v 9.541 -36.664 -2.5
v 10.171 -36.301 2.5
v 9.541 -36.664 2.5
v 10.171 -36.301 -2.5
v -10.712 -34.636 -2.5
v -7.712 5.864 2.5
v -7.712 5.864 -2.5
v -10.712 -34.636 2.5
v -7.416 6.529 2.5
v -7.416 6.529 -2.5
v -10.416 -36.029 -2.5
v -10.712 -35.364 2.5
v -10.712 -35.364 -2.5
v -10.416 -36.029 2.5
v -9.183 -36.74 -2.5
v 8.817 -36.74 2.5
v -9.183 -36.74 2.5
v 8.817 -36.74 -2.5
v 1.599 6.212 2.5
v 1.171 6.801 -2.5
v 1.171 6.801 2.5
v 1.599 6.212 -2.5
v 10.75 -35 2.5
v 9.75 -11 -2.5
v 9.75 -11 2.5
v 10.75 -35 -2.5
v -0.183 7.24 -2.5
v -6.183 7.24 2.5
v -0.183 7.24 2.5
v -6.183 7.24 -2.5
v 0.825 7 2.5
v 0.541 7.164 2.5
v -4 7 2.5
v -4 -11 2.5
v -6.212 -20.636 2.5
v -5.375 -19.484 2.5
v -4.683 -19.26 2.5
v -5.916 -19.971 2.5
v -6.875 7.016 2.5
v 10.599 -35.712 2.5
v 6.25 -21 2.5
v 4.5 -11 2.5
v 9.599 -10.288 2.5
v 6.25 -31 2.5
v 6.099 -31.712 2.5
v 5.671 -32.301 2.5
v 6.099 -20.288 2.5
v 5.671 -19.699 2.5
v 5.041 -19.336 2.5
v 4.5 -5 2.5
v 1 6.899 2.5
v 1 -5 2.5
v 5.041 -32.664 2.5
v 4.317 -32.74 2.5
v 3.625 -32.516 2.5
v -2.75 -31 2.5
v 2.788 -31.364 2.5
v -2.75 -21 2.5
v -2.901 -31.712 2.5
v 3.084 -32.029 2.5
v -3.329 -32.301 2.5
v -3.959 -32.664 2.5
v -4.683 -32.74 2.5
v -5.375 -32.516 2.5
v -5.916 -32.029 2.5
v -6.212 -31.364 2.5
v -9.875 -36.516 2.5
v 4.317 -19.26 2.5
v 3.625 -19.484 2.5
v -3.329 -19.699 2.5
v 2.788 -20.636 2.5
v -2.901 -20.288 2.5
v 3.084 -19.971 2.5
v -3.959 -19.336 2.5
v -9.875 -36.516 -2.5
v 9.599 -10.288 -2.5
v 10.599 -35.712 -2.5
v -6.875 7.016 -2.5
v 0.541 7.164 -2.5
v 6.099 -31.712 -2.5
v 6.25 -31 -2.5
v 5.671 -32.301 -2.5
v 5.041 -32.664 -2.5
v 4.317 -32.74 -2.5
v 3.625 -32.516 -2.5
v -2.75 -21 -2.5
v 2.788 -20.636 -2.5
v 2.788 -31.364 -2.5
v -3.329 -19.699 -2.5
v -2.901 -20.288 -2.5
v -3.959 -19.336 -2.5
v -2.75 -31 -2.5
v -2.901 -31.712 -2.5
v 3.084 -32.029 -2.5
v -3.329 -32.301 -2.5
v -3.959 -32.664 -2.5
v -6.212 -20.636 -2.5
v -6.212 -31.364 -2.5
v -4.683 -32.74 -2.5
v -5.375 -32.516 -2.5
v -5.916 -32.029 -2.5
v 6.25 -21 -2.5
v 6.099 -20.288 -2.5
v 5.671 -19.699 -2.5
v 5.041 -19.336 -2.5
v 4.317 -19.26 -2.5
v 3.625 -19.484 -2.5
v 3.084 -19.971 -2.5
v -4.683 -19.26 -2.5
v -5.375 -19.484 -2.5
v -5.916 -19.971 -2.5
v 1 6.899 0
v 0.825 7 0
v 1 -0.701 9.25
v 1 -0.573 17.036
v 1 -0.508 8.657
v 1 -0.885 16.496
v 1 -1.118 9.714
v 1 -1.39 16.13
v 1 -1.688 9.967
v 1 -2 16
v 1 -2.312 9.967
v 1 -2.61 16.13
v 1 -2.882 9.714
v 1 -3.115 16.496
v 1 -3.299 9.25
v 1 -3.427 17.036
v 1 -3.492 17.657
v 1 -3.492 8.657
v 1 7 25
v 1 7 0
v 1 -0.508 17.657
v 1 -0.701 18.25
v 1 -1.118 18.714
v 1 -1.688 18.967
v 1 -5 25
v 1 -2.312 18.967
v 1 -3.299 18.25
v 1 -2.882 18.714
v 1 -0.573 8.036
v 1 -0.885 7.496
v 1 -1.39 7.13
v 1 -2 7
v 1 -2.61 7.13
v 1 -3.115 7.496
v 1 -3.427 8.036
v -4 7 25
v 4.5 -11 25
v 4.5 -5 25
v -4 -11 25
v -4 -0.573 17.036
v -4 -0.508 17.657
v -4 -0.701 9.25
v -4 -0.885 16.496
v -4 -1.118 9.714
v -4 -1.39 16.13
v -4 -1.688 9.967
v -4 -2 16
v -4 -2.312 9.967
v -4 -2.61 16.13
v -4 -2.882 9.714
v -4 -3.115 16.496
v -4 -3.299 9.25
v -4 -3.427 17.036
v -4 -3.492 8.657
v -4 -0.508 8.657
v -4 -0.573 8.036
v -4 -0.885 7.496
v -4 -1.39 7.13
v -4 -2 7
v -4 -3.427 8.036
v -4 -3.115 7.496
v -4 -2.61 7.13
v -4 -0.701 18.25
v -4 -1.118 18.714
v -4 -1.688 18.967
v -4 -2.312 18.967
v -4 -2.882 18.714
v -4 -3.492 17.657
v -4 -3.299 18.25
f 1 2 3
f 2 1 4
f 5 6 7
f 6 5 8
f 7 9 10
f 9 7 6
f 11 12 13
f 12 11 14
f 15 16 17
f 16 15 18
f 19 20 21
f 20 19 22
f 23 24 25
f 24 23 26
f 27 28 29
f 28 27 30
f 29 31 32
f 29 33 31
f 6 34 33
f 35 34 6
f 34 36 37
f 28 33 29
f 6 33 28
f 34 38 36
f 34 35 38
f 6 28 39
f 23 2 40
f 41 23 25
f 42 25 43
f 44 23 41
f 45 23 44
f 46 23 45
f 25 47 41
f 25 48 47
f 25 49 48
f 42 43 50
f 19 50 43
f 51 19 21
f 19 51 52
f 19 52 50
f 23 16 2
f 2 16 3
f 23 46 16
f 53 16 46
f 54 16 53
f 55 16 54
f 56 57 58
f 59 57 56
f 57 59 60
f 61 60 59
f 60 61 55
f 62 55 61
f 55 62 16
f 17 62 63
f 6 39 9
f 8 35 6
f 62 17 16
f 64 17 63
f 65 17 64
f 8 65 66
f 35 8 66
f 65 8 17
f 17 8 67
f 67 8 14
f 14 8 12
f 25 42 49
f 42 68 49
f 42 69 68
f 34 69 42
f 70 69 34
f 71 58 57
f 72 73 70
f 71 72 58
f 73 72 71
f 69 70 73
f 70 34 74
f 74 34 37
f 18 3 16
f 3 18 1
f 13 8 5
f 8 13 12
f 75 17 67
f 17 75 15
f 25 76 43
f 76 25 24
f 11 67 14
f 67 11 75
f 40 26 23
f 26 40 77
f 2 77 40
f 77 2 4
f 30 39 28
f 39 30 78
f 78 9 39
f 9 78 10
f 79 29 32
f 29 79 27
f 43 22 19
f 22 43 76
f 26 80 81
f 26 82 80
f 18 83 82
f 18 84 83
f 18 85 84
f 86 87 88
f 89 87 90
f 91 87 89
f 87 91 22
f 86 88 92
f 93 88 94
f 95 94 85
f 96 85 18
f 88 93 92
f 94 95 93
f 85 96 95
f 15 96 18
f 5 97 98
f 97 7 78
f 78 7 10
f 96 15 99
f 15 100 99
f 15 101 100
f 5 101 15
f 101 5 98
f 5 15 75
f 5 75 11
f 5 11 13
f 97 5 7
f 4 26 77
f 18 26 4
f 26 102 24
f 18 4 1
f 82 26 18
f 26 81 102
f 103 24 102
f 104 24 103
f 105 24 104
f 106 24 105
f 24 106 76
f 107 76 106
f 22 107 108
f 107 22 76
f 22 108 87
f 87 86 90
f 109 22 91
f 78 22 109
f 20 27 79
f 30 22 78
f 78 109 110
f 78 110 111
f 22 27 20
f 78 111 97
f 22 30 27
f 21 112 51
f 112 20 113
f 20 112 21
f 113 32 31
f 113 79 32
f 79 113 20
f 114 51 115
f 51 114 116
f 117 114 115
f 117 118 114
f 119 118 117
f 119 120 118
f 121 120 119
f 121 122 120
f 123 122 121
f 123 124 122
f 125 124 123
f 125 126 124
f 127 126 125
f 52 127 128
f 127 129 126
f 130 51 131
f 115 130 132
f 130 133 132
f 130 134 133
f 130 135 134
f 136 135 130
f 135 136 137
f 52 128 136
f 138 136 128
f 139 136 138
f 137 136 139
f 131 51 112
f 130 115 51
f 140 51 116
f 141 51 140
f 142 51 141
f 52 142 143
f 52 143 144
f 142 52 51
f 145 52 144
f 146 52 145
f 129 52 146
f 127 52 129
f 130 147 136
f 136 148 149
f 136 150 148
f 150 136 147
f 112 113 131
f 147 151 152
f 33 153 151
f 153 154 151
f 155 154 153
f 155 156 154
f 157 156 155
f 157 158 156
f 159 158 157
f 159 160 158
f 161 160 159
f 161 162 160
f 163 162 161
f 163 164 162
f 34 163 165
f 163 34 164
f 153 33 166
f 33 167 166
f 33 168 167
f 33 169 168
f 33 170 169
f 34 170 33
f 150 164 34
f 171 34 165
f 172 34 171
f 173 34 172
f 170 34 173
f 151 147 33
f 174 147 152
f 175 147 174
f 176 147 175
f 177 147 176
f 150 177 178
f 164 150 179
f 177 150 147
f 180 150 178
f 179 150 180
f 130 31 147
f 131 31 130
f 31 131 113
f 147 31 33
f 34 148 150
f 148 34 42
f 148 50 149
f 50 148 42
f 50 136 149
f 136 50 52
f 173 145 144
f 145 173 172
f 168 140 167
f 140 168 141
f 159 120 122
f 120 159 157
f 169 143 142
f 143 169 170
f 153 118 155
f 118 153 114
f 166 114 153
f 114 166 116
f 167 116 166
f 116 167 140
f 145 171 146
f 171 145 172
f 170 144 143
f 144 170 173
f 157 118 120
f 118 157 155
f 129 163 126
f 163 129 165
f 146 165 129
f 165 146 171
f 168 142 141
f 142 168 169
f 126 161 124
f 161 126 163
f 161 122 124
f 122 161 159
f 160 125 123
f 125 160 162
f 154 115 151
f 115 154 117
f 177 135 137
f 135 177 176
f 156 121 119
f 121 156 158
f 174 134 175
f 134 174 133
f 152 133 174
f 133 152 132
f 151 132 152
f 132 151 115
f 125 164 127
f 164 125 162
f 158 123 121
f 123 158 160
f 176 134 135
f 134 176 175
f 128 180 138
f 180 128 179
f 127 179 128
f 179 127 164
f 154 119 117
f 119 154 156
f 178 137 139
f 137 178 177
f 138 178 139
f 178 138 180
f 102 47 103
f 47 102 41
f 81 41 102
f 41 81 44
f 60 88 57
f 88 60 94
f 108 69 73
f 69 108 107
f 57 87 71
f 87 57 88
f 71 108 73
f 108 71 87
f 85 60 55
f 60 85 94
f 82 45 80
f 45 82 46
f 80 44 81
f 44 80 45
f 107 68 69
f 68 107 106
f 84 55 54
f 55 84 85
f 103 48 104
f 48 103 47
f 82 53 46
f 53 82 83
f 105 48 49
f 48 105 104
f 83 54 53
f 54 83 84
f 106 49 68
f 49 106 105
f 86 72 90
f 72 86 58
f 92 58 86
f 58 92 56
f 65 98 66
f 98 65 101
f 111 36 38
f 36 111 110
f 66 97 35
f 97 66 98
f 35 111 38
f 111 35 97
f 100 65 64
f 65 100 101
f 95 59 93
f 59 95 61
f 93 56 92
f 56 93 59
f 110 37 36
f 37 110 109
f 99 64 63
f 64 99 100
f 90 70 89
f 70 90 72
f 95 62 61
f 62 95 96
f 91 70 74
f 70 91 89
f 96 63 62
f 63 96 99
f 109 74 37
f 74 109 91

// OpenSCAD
// CC-by-sa-3.0|Creative Commons Attribution ShareAlike 3.0 
// www.plateforme-c.org  - 16/10/2013

$fn=15;
module positif () {

//semelle


hull(){
 translate([ -9, -35, 0 ]) {
		cylinder(r = 1.75, h = 5, center = true);
	}
translate([ 0, 5.5, 0 ]) {
		cylinder(r = 1.75, h = 5, center = true);
	}
translate([ -6, 5.5, 0 ]) {
		cylinder(r = 1.75, h = 5, center = true);
	}
translate([ 8, -11, 0 ]) {
		cylinder(r = 1.75, h = 5, center = true);
	}
 translate([ 9, -35, 0 ]) {
		cylinder(r = 1.75, h = 5, center = true);
	}


}

//poteau
	translate([ -1.5, -2, 12.5 ]) {
		cube([5,18,25],center = true);
	}

	translate([ 2, -8, 12.5 ]) {
		cube([5,6,25],center = true);
	}


}


module negatif() {

//trous fixation capteur

translate([ 0, -2, 8.5 ]) {
rotate([0,90,0])
		cylinder(r = 1.5, h = 30, center = true);
	}
translate([ 0, -2, 17.5 ]) {
rotate([0,90,0])
		cylinder(r = 1.5, h = 30, center = true);
	}


	
hull() {
   translate([ 4.5, -21, 0 ]) {
		cylinder(r = 1.75, h = 30, center = true);
	}

	translate([ 4.5, -31, 0 ]) {
		cylinder(r = 1.75, h = 30, center = true);
	}
}

hull() {
	translate([ -4.5, -21, 0 ]) {
		cylinder(r = 1.75, h = 30, center = true);
	}

	translate([ -4.5, -31, 0 ]) {
		cylinder(r = 1.75, h = 30, center = true);
	}
}




}


difference() {
	positif();
	negatif();
};
